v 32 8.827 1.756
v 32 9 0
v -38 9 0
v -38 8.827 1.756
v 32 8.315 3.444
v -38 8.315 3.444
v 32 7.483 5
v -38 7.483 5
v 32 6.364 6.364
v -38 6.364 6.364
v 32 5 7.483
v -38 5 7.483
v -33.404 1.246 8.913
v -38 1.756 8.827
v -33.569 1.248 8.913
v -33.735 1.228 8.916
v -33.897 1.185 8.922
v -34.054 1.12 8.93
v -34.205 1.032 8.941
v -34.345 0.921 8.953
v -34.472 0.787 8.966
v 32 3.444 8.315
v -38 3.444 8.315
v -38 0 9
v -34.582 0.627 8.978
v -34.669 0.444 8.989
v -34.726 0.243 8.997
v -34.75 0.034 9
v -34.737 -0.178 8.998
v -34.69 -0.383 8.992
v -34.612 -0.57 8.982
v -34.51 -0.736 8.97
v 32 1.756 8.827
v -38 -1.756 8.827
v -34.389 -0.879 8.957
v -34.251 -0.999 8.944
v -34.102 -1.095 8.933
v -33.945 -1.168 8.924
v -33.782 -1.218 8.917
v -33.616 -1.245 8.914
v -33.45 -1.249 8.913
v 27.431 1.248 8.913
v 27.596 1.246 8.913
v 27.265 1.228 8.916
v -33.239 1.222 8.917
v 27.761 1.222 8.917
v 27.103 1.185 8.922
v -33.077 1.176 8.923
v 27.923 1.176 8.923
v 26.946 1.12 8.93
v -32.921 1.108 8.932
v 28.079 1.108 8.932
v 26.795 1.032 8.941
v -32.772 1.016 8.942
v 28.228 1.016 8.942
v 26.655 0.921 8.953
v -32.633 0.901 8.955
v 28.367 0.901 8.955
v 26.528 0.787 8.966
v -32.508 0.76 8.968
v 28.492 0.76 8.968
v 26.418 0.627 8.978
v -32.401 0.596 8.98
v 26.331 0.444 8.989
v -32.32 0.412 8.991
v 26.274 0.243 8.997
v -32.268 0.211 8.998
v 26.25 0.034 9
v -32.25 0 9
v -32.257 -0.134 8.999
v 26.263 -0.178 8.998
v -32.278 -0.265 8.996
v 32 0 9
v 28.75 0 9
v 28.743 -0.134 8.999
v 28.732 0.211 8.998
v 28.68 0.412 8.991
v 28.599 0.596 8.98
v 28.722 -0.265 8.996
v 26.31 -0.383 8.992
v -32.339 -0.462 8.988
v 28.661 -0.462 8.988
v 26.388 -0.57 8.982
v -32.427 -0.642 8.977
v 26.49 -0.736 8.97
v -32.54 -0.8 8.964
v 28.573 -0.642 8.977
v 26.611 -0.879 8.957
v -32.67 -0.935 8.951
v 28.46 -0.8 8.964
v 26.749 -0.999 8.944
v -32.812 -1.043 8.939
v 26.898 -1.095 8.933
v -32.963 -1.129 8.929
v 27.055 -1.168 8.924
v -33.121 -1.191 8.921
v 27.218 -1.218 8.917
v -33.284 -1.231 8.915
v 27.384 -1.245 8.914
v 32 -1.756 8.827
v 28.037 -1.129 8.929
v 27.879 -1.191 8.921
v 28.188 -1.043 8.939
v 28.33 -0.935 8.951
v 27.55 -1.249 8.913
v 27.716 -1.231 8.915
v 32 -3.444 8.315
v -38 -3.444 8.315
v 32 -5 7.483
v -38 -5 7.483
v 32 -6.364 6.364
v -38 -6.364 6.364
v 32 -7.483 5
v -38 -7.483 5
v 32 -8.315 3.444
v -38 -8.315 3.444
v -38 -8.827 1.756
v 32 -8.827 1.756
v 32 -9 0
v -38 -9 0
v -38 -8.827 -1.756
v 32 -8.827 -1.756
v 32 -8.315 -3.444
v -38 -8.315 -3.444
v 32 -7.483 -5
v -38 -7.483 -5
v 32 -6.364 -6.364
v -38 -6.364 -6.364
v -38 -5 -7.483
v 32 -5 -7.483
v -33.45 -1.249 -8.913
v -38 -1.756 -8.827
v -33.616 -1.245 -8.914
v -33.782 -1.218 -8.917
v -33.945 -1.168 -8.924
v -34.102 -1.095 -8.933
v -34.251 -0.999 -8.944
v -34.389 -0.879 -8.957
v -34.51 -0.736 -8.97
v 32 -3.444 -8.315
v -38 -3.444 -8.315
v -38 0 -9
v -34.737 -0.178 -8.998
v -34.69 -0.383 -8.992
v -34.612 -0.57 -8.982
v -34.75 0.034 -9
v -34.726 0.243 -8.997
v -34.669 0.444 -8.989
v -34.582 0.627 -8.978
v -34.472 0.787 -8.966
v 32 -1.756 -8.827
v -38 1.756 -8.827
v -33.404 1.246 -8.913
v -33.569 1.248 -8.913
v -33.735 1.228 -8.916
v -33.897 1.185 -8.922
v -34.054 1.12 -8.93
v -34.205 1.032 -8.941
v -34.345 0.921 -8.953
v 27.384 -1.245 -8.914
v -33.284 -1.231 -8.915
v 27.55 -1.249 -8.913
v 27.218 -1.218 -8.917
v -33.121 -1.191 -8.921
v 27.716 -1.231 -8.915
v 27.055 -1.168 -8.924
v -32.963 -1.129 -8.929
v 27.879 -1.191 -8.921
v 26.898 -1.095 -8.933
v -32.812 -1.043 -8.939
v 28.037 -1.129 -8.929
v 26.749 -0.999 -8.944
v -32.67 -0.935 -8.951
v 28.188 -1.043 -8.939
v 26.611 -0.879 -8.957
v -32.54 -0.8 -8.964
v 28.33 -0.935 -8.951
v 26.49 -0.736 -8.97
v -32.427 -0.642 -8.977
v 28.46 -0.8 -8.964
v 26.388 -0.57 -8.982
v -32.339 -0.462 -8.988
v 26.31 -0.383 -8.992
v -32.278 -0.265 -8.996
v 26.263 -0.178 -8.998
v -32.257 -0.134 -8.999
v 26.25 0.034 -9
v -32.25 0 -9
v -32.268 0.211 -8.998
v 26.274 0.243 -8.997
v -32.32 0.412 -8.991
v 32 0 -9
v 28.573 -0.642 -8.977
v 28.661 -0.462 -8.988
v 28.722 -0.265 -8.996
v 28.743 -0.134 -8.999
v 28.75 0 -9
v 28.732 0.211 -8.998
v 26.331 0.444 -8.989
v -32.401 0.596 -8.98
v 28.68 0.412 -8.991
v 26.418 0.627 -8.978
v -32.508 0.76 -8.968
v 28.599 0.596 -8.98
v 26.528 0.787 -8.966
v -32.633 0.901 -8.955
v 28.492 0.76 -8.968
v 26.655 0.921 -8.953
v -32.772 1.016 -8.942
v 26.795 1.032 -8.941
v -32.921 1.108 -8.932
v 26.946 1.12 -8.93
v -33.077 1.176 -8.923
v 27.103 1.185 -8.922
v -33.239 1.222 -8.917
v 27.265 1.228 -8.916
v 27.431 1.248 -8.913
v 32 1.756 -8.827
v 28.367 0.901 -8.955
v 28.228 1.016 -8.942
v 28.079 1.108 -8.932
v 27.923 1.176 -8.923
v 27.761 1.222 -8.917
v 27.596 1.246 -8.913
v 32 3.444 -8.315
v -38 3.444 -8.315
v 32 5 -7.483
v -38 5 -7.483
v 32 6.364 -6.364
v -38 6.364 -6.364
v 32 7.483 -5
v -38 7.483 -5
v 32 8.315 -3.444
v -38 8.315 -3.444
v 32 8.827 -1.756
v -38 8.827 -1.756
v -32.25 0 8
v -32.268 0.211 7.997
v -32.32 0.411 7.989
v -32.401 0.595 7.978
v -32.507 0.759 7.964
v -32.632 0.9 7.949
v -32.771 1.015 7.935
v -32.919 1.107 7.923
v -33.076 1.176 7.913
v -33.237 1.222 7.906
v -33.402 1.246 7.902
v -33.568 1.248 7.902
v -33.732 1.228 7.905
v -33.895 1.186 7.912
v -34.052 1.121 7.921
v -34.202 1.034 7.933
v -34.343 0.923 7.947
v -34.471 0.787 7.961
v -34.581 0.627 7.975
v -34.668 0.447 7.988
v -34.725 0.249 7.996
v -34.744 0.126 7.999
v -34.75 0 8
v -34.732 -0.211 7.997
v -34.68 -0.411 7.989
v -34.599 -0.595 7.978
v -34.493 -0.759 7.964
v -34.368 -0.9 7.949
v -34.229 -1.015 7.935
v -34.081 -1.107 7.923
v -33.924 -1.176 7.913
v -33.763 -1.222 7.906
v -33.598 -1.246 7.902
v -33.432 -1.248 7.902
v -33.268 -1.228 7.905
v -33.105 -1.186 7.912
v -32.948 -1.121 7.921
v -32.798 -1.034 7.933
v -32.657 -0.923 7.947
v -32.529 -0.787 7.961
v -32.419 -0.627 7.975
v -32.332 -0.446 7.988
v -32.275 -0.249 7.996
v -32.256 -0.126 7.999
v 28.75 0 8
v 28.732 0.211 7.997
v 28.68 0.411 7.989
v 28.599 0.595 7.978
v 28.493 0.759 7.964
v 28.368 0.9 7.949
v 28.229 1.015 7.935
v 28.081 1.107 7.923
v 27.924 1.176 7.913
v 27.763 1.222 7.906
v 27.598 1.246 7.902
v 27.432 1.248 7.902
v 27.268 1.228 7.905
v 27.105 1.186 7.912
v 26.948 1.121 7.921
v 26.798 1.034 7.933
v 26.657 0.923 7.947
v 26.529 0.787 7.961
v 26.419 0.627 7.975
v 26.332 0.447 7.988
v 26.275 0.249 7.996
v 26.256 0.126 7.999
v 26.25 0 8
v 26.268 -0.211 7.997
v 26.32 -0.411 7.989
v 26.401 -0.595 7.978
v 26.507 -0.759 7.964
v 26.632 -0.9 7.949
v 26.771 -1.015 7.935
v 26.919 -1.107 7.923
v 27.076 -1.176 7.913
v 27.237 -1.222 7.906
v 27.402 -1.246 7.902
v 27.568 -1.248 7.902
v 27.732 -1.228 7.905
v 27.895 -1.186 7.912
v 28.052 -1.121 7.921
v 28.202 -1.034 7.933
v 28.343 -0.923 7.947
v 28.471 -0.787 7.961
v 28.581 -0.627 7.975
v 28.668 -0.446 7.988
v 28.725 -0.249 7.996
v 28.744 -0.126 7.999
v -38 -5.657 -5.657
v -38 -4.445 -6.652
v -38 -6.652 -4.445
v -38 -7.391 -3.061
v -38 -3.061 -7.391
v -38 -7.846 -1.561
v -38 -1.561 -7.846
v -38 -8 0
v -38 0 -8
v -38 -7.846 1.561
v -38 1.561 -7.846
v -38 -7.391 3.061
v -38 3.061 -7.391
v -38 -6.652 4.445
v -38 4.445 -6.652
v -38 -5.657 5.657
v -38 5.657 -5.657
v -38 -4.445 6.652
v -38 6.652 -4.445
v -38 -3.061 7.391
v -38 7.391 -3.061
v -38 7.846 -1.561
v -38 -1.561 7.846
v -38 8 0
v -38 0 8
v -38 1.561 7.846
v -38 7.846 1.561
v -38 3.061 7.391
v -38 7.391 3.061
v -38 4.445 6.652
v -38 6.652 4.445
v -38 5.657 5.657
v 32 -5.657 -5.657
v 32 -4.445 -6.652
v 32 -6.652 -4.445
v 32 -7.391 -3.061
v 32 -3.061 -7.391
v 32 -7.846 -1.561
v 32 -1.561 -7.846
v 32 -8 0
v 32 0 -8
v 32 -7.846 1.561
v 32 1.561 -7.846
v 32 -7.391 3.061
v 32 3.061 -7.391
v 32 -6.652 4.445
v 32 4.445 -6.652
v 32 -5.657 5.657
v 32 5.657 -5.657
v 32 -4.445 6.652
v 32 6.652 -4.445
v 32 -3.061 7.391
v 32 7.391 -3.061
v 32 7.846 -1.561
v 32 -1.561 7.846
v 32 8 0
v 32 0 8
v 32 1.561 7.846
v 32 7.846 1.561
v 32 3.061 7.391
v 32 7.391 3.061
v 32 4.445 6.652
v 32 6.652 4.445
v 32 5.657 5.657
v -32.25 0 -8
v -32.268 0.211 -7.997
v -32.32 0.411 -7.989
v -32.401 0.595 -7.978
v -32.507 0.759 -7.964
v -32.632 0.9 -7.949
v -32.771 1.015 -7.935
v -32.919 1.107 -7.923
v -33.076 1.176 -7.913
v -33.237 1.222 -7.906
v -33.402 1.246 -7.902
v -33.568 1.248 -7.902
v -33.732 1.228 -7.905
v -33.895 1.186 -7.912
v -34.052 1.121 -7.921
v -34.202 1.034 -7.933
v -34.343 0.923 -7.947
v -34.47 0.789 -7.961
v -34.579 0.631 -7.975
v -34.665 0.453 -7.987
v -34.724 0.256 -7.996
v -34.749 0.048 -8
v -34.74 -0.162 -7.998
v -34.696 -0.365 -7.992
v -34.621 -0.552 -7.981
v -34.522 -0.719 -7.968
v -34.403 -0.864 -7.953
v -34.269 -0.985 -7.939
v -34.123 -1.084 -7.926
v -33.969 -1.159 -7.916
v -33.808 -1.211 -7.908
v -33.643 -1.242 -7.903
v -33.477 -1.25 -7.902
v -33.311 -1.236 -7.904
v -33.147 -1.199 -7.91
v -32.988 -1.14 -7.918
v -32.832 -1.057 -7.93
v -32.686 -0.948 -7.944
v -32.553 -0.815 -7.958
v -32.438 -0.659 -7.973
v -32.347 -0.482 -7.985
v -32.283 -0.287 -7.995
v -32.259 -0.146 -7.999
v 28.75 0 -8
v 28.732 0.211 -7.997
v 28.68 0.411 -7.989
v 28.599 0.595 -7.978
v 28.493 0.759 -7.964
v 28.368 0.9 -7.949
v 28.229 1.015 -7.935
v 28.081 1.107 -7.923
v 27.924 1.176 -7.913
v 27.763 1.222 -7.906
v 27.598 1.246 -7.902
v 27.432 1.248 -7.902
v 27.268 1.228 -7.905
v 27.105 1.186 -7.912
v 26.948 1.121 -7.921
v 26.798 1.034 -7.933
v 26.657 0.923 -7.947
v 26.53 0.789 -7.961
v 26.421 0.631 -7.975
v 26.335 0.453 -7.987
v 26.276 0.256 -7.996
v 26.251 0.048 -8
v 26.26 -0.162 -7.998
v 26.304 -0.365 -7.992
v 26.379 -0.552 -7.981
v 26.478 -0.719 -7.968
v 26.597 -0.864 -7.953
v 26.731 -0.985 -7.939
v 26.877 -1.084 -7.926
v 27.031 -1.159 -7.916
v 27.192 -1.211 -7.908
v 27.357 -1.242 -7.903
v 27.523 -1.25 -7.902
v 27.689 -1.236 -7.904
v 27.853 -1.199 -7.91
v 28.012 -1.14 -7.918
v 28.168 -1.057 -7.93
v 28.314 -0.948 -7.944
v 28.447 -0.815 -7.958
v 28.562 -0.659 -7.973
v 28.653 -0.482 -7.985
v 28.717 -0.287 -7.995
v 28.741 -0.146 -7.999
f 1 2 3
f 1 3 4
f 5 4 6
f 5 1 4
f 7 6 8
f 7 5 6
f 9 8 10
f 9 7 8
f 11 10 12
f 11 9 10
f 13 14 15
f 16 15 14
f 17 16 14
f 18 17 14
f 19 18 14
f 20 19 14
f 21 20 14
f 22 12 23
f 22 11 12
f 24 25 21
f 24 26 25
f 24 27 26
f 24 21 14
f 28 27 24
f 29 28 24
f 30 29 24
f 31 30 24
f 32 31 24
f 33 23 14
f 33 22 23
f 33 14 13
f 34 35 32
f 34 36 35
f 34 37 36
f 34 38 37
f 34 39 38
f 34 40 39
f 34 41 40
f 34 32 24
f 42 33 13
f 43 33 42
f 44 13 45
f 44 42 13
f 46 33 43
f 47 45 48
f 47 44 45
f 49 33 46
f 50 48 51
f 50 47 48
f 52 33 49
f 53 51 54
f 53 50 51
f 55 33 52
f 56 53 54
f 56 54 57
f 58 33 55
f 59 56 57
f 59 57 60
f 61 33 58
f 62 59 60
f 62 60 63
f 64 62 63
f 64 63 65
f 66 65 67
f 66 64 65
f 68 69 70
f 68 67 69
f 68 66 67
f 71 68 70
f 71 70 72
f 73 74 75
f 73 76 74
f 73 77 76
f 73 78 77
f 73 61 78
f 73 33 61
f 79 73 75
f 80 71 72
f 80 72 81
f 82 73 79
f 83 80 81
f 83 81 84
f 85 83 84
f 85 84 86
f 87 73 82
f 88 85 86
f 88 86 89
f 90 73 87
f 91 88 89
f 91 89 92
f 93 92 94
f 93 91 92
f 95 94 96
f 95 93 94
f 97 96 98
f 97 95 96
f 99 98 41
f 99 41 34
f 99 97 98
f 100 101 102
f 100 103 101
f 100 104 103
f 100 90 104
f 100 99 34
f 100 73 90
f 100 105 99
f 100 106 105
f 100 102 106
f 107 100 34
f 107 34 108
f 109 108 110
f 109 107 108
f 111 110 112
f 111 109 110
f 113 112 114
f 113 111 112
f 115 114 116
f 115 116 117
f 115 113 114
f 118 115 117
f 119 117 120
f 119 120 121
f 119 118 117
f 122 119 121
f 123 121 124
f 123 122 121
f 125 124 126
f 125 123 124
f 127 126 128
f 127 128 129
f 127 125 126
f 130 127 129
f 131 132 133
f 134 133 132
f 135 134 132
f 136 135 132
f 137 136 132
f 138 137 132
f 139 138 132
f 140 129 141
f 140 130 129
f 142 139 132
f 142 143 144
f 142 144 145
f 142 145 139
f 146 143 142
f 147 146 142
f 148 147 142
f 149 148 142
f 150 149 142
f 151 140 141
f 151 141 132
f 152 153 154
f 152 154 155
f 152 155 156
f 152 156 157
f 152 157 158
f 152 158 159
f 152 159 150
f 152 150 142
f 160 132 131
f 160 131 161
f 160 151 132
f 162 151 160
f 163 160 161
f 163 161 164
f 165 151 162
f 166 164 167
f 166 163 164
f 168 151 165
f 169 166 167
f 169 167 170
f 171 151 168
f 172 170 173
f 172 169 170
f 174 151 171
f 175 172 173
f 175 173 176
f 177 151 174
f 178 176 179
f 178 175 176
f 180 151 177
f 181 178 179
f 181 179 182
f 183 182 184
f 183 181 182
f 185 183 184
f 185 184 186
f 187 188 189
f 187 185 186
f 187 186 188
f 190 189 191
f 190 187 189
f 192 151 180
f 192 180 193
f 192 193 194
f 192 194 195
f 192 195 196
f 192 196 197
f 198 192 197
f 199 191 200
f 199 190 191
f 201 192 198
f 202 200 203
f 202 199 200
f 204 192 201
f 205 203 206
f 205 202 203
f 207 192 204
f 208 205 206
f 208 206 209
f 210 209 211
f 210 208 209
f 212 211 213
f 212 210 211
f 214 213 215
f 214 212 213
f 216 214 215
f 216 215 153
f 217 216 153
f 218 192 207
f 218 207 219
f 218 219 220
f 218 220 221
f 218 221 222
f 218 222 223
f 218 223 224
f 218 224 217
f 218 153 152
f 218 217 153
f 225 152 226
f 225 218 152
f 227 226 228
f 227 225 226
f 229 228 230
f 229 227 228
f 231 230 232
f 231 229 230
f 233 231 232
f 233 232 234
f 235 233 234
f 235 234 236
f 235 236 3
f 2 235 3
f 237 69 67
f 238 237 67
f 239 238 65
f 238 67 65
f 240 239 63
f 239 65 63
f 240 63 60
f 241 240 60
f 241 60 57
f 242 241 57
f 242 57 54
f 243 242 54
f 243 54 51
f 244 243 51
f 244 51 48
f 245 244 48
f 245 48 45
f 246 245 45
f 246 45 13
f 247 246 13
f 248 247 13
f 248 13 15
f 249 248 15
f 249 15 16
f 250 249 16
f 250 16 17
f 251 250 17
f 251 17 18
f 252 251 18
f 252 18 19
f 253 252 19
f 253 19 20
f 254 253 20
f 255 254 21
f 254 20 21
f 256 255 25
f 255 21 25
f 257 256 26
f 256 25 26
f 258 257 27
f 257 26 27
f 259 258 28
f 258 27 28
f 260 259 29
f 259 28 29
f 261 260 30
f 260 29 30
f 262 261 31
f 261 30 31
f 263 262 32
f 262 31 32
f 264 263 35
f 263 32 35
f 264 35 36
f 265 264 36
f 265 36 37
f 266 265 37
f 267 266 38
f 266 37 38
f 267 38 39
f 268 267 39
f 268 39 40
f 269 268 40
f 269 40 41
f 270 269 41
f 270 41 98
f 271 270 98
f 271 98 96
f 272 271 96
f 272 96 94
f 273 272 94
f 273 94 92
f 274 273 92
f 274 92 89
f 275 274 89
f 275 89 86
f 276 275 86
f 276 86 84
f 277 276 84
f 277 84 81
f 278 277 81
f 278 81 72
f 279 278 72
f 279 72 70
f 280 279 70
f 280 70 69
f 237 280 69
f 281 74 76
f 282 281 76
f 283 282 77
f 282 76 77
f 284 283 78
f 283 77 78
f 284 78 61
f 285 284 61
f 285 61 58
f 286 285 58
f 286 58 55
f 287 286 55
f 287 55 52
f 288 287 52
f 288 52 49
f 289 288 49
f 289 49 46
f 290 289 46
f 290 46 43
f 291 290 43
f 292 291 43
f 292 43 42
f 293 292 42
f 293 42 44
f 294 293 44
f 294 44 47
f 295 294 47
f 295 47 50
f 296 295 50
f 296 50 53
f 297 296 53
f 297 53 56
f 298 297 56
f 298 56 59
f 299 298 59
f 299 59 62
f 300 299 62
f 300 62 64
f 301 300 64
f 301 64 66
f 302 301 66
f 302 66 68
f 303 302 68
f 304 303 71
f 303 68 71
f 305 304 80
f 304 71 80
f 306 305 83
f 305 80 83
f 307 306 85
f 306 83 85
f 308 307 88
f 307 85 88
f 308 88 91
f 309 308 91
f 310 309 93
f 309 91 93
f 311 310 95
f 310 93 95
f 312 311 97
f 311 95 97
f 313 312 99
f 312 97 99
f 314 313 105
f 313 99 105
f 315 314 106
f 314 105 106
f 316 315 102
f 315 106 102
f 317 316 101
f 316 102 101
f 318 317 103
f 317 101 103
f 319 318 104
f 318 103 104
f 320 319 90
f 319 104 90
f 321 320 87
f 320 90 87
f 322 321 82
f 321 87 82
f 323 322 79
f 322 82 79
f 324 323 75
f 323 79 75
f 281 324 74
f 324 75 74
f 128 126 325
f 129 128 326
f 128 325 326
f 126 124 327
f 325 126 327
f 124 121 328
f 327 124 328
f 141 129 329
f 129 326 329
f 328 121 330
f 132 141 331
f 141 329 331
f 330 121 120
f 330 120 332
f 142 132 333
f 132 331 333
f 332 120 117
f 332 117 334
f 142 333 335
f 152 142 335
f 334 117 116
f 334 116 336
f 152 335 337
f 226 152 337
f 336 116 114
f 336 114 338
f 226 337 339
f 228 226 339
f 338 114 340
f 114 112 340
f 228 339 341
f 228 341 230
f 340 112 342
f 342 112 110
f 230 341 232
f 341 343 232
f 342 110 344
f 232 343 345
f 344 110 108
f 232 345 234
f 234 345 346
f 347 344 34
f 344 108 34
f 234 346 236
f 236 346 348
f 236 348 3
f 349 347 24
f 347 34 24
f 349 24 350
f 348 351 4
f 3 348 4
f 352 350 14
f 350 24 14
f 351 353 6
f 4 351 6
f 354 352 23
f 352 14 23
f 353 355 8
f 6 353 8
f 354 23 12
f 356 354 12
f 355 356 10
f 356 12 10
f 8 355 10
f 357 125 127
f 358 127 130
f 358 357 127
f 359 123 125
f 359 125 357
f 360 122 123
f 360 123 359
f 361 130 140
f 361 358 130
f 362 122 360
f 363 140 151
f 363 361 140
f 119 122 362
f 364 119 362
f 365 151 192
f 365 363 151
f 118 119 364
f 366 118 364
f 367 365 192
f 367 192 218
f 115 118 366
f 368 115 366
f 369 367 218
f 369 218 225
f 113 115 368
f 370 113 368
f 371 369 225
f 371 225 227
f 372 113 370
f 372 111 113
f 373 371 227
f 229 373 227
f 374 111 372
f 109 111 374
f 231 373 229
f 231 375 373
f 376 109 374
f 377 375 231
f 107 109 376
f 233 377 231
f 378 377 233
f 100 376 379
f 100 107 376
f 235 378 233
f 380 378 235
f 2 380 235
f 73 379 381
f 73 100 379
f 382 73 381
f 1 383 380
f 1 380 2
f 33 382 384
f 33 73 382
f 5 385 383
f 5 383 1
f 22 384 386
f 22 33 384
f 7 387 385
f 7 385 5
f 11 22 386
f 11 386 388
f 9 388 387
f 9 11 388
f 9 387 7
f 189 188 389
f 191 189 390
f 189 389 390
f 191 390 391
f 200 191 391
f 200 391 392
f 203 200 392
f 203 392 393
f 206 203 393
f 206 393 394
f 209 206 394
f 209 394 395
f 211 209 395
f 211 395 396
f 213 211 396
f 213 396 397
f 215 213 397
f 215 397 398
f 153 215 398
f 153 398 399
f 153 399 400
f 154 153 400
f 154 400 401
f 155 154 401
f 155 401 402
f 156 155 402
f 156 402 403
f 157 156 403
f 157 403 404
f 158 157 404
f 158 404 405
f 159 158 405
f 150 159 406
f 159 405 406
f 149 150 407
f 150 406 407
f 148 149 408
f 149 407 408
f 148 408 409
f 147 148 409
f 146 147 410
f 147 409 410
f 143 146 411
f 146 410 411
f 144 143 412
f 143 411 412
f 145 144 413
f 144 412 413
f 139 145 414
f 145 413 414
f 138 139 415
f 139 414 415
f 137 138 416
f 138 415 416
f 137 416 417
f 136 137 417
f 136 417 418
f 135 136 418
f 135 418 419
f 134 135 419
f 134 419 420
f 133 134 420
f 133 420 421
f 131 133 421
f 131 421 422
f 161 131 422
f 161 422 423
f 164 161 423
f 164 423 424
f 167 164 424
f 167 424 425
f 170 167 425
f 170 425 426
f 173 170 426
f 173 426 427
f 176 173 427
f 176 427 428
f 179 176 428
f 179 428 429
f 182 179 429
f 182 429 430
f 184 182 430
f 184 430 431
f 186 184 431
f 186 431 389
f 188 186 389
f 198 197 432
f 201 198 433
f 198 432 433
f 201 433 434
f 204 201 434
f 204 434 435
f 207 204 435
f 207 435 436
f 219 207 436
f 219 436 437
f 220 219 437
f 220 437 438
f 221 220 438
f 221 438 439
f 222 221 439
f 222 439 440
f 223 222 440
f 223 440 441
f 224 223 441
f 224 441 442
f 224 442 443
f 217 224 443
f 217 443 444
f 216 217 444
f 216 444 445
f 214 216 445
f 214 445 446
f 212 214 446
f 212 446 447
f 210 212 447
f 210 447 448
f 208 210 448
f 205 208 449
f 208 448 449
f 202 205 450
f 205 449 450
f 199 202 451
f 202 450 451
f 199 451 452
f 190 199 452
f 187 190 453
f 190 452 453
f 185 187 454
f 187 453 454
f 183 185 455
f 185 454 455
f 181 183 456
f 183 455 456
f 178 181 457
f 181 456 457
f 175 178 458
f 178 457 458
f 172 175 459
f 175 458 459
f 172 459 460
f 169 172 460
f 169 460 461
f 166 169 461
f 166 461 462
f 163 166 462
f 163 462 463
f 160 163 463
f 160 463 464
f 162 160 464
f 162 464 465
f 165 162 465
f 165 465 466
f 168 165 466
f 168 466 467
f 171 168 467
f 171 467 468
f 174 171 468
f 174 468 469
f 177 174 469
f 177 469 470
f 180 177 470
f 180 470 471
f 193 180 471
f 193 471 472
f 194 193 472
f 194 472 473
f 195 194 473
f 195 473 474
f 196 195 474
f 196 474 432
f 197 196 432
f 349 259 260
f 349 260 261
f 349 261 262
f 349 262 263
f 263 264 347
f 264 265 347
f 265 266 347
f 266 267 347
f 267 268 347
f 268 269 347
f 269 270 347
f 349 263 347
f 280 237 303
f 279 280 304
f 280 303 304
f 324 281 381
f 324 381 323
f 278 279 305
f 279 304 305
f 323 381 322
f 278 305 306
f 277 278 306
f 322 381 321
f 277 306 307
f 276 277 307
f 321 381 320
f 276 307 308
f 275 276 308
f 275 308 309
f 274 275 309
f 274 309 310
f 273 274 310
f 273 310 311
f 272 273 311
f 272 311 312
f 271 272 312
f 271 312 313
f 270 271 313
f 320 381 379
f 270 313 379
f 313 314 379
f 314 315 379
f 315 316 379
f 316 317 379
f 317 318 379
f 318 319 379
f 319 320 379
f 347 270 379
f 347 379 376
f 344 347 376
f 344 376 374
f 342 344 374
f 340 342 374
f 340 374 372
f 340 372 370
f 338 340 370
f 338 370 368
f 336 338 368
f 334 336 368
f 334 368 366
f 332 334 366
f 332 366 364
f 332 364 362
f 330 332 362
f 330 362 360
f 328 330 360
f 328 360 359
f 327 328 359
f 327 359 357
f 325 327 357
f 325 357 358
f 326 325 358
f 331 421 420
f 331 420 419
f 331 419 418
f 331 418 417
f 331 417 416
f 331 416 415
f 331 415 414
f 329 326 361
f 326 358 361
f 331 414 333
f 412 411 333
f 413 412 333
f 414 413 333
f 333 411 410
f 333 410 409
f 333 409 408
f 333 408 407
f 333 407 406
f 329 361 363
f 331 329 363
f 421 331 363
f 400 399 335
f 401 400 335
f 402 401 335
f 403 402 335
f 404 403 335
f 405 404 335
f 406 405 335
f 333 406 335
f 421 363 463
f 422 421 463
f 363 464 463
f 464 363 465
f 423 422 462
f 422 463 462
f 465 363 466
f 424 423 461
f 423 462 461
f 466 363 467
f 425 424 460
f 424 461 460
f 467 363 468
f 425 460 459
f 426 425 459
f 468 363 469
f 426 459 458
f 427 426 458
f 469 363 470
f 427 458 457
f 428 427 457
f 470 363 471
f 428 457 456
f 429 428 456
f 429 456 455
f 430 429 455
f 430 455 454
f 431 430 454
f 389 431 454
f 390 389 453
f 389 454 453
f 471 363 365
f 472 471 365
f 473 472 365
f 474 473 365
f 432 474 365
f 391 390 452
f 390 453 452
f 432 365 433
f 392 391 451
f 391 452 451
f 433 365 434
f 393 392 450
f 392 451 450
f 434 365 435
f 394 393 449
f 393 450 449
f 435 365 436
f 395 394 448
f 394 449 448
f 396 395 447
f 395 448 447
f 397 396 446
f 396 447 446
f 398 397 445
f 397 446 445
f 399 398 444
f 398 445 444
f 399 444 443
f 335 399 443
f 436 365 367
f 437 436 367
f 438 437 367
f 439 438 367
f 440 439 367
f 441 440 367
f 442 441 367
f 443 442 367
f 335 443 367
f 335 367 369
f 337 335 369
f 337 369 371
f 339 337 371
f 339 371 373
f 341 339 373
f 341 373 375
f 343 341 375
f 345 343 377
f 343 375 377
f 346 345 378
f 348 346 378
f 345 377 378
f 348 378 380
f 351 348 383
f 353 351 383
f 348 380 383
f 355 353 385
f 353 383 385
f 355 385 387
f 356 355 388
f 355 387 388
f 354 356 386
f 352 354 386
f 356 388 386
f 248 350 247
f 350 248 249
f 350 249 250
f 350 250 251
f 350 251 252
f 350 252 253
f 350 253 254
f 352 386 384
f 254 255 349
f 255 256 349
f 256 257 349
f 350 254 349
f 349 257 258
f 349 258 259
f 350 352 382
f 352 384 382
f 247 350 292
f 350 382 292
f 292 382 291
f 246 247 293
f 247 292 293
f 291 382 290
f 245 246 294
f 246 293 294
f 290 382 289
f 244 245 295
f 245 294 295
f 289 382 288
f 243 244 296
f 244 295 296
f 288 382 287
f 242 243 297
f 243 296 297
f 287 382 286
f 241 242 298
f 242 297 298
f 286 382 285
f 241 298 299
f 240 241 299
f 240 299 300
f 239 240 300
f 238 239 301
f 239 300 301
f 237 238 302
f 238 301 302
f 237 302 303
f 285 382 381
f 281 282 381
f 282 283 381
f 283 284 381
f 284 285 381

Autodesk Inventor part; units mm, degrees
ref_plane "YZ Plane" through (0, 0, 0) normal (1, 0, 0) x (0, 1, 0)
ref_plane "XZ Plane" through (0, 0, 0) normal (0, 1, 0) x (-1, 0, 0)
sketch "ShaftProfile" plane through (0, 0, 0) normal (0, 0, 1) x (1, 0, 0)
  line L0 (-52, 0) -> (46, 0) construction
  line L1 (-38, 9) -> (32, 9)
  line L2 (32, 9) -> (32, 0)
  line L3 (-38, 0) -> (-38, 9)
  line L4 (-38, 0) -> (32, 0)
  point P0 (0, 0)
  dimension "d1" = 70
  dimension "d2" = 9
  dimension "d4" = 38
revolve "ShaftFeature" add sketch "ShaftProfile" angle 360 about axis through (-38, 0, 0) along (1, 0, 0)
sketch "Sketch2" plane through (-38, 0, 0) normal (-1, 0, 0) x (0, 0, 1)
  circle A0 centre (0, 0) radius 9 projected
hole "ShaftHoleFeature" at (-38, 0, 0) direction (1, 0, 0) diameter 16 end through all
ref_plane "MidSidePlane" through (0, 0, 10) normal (0, 0, 1) x (1, 0, 0)
sketch "CapHoles" plane through (0, 0, 10) normal (0, 0, 1) x (1, 0, 0)
  line L0 (32, -9) -> (32, 9) construction
  line L1 (-38, -9) -> (-38, 9) construction
  line L2 (-53, 0) -> (52, 0) construction
  circle A0 centre (-33.5, 0) radius 1.25
  circle A1 centre (27.5, 0) radius 1.25
  dimension "d24" = 2.5
  dimension "d25" = 4.5
  dimension "d26" = 4.5
extrude "CapHolesFeature" cut sketch "CapHoles" against normal through all
equation "\"d26\" = d25"
properties part number "BackPair1PistonShaft"
